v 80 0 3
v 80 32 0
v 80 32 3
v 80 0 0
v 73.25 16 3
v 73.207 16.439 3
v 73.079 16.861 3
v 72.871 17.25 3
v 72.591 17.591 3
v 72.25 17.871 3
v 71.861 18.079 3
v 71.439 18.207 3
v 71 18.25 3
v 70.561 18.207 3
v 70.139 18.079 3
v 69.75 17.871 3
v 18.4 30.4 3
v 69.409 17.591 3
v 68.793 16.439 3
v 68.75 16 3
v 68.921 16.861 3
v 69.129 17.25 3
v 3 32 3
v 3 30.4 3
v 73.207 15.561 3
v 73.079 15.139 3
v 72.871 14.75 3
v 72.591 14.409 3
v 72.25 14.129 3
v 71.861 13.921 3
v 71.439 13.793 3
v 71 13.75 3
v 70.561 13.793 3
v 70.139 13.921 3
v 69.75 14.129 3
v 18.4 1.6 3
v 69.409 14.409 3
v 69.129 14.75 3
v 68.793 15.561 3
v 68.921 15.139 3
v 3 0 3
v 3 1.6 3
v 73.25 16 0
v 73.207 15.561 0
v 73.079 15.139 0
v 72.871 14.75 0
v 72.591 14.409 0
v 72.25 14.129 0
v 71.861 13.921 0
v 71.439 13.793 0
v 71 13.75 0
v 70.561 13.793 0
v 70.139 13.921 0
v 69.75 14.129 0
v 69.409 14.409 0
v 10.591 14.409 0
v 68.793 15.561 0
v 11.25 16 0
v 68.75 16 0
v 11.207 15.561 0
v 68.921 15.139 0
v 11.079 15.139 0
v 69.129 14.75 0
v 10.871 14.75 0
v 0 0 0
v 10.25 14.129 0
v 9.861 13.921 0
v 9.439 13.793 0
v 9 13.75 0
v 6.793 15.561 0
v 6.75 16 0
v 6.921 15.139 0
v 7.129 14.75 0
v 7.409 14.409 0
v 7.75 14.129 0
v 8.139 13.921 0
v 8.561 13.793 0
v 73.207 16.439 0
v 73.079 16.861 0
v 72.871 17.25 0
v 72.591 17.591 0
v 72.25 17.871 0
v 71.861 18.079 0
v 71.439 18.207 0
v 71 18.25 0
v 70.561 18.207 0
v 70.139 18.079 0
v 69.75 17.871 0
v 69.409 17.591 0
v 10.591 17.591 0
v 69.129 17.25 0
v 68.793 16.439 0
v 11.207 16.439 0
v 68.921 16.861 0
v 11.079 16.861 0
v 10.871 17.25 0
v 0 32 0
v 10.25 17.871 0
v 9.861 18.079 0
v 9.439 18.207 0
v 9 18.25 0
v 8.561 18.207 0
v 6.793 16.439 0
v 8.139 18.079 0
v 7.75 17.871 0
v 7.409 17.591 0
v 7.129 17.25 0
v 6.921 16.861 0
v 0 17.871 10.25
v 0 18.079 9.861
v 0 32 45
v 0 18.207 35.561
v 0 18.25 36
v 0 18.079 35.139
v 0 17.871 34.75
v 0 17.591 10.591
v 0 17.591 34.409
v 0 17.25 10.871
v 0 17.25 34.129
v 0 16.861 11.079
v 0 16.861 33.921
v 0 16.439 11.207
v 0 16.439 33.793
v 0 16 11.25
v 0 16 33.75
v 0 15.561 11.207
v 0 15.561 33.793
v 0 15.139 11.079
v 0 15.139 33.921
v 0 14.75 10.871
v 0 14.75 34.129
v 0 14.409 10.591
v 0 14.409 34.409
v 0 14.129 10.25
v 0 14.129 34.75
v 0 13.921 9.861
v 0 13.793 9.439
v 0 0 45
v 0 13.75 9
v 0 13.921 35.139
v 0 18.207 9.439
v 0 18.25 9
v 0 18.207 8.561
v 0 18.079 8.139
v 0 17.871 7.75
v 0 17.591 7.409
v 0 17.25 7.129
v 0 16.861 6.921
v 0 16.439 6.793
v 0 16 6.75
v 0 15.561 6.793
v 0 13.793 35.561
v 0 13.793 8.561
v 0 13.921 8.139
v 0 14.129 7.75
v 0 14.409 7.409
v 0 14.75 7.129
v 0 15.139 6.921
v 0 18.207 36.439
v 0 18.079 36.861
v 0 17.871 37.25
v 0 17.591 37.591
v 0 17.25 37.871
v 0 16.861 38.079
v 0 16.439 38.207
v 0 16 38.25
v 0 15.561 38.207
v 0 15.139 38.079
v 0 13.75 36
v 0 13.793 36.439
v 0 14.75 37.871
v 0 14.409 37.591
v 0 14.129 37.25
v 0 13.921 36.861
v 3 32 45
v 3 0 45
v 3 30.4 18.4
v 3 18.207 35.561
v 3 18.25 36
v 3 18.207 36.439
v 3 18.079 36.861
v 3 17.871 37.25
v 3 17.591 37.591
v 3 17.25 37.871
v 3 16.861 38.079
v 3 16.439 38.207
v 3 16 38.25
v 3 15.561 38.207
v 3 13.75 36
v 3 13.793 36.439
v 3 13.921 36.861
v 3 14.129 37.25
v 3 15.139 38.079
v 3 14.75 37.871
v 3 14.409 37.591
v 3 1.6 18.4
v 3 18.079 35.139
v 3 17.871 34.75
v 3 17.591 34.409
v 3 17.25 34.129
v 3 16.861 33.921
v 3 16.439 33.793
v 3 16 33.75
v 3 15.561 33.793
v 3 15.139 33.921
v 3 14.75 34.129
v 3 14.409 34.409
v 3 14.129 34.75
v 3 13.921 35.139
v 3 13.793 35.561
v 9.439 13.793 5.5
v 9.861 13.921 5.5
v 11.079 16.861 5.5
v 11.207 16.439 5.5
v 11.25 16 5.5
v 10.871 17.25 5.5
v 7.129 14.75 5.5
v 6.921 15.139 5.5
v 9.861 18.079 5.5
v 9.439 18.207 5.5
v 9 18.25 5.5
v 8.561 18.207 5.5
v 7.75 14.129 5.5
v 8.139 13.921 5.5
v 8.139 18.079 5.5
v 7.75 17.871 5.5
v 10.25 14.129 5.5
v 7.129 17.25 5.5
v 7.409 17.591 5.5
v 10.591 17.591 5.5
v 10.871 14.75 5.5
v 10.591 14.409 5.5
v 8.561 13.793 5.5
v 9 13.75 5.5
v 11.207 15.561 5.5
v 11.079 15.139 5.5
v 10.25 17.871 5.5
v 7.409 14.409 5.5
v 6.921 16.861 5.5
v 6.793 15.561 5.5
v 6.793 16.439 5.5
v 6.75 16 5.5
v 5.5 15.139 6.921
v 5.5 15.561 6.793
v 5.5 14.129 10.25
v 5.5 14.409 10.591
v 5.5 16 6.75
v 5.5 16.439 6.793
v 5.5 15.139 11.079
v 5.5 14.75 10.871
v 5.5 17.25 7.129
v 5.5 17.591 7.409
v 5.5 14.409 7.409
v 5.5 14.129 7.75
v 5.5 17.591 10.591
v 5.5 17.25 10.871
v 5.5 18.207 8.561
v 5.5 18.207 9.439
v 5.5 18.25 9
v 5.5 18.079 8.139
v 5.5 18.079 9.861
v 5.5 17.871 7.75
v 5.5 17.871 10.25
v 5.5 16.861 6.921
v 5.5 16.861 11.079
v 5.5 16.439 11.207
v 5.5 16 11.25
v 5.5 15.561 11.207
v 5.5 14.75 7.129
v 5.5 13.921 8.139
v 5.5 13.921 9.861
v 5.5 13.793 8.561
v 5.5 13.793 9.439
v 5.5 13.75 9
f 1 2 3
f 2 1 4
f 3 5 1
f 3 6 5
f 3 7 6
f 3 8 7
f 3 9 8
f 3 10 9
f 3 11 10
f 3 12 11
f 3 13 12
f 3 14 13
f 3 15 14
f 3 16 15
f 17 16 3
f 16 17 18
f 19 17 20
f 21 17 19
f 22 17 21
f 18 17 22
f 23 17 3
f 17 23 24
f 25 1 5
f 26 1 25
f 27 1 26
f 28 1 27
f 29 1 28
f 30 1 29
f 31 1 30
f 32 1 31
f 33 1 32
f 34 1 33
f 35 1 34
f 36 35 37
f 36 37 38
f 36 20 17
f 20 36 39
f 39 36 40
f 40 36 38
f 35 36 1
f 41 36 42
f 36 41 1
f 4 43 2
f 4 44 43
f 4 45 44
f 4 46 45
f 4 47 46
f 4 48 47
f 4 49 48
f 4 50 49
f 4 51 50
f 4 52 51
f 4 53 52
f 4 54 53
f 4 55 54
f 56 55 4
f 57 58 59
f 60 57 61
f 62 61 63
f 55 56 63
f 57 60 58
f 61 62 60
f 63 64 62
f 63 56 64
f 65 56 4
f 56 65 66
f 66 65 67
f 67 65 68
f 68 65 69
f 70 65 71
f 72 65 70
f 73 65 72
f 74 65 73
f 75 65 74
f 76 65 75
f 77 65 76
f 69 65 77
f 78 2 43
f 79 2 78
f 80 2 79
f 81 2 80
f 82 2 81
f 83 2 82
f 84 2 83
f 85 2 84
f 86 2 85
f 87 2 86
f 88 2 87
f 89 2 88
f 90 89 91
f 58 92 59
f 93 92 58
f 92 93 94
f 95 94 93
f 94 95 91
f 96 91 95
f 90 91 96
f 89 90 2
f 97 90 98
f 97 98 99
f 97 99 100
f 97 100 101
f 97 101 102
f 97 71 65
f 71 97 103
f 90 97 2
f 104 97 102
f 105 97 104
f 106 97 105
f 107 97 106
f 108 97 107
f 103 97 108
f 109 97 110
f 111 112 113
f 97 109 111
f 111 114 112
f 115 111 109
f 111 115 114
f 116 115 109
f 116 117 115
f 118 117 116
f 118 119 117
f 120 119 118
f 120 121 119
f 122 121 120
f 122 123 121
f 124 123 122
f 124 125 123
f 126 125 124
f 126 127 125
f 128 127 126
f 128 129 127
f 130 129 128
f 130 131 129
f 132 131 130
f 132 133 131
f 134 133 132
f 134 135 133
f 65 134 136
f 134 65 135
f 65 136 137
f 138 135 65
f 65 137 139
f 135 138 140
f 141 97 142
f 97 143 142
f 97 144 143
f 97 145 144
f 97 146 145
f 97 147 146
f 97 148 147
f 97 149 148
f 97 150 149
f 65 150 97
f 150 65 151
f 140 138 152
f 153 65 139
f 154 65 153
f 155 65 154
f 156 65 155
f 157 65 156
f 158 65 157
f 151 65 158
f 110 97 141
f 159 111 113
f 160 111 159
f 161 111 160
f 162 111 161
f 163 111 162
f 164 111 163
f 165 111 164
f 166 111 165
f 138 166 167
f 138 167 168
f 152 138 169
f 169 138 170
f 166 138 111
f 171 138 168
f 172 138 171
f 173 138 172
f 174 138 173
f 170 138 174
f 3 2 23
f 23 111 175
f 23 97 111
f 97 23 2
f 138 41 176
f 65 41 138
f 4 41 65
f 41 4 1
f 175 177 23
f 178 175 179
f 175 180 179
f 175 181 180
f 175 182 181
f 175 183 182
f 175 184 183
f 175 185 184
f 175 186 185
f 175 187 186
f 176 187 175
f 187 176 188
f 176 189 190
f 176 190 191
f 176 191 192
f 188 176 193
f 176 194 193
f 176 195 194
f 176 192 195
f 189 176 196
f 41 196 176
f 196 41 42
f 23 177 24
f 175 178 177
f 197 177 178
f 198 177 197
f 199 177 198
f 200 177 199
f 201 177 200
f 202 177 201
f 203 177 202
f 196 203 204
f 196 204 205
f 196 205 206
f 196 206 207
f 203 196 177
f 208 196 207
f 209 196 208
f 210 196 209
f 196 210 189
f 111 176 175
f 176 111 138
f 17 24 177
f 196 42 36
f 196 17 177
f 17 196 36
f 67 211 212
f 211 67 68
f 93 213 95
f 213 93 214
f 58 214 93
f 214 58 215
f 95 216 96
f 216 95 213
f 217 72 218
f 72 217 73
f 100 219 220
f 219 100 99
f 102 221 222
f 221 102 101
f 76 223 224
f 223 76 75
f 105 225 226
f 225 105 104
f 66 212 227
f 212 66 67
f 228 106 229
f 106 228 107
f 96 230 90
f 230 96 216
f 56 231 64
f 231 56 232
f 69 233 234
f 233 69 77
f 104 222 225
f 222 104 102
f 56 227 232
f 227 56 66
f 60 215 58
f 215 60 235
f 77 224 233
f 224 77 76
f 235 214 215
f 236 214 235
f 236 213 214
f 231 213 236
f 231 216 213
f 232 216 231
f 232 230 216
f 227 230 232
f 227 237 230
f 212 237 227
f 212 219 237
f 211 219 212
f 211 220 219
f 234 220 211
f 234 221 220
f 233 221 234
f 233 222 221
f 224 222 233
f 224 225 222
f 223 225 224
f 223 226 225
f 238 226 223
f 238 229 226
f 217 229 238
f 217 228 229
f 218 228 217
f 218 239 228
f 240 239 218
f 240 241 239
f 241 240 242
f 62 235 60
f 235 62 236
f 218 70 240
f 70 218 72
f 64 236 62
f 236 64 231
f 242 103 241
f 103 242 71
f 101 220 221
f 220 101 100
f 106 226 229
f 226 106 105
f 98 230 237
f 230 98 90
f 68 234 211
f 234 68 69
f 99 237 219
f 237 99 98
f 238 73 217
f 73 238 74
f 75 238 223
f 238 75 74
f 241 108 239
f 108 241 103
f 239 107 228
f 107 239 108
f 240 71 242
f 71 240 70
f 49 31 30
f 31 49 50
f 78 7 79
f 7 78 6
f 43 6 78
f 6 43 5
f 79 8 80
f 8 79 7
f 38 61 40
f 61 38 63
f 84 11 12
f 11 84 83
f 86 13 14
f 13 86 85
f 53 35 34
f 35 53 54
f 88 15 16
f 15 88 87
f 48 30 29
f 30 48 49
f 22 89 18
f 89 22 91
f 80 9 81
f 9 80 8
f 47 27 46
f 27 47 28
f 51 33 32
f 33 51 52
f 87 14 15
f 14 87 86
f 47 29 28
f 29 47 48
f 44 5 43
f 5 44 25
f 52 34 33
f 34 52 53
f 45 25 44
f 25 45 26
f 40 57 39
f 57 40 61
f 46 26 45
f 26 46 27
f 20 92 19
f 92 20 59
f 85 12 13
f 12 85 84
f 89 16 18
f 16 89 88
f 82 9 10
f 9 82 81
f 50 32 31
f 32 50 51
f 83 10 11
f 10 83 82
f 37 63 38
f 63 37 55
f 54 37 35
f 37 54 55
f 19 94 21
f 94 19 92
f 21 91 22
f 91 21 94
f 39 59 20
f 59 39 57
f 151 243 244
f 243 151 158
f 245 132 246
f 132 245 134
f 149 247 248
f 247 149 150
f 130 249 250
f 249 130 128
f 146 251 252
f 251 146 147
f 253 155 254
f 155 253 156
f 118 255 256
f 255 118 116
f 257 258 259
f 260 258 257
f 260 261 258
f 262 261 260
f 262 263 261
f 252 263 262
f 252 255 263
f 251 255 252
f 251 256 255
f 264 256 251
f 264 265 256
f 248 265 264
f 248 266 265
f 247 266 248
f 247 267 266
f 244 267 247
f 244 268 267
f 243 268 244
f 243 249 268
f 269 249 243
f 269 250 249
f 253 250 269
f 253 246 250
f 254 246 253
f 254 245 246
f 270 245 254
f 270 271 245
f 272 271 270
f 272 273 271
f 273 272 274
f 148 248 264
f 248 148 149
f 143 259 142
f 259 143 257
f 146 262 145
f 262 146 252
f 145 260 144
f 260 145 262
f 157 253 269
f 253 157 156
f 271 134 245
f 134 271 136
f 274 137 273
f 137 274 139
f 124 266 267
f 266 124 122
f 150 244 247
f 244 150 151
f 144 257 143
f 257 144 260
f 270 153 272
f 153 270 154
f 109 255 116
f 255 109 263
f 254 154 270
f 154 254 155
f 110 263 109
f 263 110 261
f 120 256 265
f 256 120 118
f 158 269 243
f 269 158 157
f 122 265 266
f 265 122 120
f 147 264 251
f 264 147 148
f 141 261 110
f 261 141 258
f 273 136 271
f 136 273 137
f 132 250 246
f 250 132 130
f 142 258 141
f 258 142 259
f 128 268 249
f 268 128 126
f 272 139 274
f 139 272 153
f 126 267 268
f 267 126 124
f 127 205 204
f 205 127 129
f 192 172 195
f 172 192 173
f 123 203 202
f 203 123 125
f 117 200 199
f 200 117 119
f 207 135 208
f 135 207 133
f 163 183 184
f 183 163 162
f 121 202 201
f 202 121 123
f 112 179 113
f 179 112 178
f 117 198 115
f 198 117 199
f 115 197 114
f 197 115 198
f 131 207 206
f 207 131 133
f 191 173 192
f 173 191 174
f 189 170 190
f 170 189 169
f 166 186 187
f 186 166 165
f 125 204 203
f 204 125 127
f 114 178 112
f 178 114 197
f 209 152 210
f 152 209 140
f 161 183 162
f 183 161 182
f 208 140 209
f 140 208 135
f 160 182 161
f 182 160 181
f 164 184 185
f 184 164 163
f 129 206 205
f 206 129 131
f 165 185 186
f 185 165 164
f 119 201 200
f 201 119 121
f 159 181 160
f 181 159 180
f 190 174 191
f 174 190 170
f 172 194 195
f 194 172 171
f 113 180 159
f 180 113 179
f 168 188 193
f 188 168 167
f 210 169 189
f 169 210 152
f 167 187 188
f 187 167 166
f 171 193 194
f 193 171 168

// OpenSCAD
$fn = 32;

// ----------------------------------------------------------------------
// L-bracket: 80 x 32 x 45 mm
// ----------------------------------------------------------------------

// --- parameters (mm) ---
base_len = 80;            // horizontal leg, X
upright_h = 45;           // vertical leg, Z
flange_w = 32;            // bracket depth, Y
mat_t = 3;                // plate thickness
hole_d = 4.5;             // clearance for M4
rib_leg = 19.8;           // gusset leg
rib_sink = 1.6;           // gusset overlap into the plates

module hole_z(px, py) {
  translate([px, py, -2.5]) cylinder(h = mat_t + 5, d = hole_d);
}
module hole_x(pz, py) {
  translate([-2.5, py, pz]) rotate([0, 90, 0]) cylinder(h = mat_t + 5, d = hole_d);
}
module gusset() {
  translate([0, flange_w - rib_sink, 0])
    rotate([90, 0, 0])
      linear_extrude(height = flange_w - 2 * rib_sink)
        polygon(points = [[rib_sink, rib_sink], [rib_leg, rib_sink], [rib_sink, rib_leg]]);
}

difference() {
  union() {
    /* horizontal leg */
    cube([base_len, flange_w, mat_t]);
    /* vertical leg, overlapping the corner block */
    cube([mat_t, flange_w, upright_h]);
    gusset();
  }
  hole_z(9, 16);
  hole_z(71, 16);
  hole_x(9, 16);
  hole_x(36, 16);
}
